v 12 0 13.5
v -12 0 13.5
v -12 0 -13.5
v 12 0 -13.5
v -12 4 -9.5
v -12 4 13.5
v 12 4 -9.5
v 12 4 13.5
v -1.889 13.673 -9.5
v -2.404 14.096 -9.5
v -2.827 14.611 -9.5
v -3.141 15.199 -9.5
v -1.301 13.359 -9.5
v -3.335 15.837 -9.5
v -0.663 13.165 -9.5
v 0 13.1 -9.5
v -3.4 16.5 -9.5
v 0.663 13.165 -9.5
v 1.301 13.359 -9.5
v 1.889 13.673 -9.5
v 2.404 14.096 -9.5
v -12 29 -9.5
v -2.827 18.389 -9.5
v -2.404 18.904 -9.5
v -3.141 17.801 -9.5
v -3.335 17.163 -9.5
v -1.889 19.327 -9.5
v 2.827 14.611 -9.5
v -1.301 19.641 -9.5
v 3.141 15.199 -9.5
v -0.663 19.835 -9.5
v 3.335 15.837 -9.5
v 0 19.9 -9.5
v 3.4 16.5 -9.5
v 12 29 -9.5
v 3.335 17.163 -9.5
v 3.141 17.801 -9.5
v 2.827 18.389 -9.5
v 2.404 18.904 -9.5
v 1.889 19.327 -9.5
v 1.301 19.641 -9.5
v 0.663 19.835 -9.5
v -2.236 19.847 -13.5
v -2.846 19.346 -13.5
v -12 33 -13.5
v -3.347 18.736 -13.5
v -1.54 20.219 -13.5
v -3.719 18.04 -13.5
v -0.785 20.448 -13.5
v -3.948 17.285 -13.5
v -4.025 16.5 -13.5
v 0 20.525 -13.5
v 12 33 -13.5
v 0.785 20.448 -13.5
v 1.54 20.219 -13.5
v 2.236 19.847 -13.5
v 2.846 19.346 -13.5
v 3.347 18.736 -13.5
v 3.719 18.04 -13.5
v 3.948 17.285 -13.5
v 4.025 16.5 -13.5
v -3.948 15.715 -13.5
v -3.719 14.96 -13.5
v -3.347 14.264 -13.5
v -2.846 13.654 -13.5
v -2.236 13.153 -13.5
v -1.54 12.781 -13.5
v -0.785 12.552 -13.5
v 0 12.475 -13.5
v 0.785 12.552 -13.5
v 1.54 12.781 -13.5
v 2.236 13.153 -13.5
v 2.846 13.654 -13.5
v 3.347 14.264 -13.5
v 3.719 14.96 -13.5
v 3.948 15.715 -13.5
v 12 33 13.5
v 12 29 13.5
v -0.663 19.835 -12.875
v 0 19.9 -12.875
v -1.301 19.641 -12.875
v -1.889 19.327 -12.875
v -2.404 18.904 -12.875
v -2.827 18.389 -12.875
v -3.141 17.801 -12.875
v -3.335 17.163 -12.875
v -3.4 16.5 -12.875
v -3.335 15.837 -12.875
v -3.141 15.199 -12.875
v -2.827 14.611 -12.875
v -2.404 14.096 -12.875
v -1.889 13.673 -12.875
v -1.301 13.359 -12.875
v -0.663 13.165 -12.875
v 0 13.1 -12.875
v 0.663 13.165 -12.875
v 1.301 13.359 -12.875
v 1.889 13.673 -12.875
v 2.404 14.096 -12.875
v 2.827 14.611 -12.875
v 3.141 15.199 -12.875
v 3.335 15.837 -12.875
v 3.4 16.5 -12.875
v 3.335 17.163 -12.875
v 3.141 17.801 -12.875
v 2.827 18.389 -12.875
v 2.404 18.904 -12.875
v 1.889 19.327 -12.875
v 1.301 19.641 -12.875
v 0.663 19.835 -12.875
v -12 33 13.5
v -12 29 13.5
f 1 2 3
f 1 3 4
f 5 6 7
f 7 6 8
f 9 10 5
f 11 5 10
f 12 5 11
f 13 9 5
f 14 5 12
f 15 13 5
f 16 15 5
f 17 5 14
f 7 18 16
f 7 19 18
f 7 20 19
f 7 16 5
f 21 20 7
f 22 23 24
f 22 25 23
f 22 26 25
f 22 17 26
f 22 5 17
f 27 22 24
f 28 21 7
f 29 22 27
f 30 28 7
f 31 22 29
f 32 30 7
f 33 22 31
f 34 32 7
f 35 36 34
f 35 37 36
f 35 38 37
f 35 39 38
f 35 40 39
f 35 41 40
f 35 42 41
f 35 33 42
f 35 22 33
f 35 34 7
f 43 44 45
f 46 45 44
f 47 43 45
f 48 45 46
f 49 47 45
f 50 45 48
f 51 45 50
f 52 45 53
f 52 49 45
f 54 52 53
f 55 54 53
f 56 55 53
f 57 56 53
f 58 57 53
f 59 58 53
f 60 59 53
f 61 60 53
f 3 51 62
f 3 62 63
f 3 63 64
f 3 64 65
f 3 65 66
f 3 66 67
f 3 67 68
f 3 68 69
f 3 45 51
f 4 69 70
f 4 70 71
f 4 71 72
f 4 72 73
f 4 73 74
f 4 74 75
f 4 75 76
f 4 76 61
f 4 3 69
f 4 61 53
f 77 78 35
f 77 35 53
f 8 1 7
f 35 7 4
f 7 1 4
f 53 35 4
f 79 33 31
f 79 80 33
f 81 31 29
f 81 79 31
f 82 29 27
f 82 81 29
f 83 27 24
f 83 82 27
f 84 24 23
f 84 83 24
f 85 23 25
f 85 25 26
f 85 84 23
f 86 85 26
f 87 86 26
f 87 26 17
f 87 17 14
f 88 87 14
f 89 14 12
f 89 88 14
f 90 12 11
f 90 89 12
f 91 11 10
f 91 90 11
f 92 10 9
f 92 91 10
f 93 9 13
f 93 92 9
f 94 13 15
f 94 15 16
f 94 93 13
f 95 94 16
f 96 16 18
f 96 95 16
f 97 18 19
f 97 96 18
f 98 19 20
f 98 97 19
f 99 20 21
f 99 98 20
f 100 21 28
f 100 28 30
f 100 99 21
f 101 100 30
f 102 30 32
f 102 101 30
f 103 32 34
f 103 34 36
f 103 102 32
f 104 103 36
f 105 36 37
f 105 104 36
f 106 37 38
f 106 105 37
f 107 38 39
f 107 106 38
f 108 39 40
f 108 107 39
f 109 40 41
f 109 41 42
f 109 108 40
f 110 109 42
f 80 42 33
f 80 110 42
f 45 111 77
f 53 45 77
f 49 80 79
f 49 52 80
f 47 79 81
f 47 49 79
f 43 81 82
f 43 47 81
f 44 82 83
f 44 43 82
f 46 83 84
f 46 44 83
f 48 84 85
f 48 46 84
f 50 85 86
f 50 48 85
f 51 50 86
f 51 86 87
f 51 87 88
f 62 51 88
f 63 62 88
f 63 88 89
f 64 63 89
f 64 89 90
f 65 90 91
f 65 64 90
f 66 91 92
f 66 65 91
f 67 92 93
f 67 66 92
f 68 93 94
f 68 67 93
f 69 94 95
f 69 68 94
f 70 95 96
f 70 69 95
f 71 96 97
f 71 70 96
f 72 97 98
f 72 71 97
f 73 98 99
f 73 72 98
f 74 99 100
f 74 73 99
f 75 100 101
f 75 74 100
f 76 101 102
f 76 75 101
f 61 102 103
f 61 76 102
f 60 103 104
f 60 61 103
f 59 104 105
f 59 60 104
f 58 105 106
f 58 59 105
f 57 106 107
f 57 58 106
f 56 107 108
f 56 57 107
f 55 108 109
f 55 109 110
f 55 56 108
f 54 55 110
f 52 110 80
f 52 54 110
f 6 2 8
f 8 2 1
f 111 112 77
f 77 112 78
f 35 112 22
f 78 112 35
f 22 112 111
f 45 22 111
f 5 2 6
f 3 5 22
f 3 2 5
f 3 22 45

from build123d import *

# Parameters (mm, degrees)
SKETCH_1_W          = 24
SKETCH_1_H          = 27
EXTRUDE_1_DEPTH     = 33
SKETCH_3_W          = 24
SKETCH_3_H          = 25
CUT_EXTRUDE_1_DEPTH = 23


with BuildPart() as part:
    # 草图1 → 凸台-拉伸1 (new body)
    with BuildSketch(Plane(origin=(0, 0, 0), x_dir=(1, 0, 0), z_dir=(0, 1, 0))):
        Rectangle(SKETCH_1_W, SKETCH_1_H)
    extrude(amount=EXTRUDE_1_DEPTH)

    # 草图3 → 切除-拉伸1 (cut)
    with BuildSketch(Plane.XY.offset(13.5)):
        with Locations((0, 16.5)):
            Rectangle(SKETCH_3_W, SKETCH_3_H)
    extrude(amount=-CUT_EXTRUDE_1_DEPTH, mode=Mode.SUBTRACT)

    # 草图5 → M8 螺纹孔1 (revolve, cut)
    with BuildSketch(Plane(origin=(0, 16.5, -13.5), x_dir=(0, 1, 0), z_dir=(1, 0, 0))):
        Polygon((0, 0), (0, 4), (3.4, 4), (3.4, 0.625), (4.025, 0), align=None)
    revolve(axis=Axis((0, 16.5, -19.85), (0, 0, 1)), mode=Mode.SUBTRACT)


solid = part.part
